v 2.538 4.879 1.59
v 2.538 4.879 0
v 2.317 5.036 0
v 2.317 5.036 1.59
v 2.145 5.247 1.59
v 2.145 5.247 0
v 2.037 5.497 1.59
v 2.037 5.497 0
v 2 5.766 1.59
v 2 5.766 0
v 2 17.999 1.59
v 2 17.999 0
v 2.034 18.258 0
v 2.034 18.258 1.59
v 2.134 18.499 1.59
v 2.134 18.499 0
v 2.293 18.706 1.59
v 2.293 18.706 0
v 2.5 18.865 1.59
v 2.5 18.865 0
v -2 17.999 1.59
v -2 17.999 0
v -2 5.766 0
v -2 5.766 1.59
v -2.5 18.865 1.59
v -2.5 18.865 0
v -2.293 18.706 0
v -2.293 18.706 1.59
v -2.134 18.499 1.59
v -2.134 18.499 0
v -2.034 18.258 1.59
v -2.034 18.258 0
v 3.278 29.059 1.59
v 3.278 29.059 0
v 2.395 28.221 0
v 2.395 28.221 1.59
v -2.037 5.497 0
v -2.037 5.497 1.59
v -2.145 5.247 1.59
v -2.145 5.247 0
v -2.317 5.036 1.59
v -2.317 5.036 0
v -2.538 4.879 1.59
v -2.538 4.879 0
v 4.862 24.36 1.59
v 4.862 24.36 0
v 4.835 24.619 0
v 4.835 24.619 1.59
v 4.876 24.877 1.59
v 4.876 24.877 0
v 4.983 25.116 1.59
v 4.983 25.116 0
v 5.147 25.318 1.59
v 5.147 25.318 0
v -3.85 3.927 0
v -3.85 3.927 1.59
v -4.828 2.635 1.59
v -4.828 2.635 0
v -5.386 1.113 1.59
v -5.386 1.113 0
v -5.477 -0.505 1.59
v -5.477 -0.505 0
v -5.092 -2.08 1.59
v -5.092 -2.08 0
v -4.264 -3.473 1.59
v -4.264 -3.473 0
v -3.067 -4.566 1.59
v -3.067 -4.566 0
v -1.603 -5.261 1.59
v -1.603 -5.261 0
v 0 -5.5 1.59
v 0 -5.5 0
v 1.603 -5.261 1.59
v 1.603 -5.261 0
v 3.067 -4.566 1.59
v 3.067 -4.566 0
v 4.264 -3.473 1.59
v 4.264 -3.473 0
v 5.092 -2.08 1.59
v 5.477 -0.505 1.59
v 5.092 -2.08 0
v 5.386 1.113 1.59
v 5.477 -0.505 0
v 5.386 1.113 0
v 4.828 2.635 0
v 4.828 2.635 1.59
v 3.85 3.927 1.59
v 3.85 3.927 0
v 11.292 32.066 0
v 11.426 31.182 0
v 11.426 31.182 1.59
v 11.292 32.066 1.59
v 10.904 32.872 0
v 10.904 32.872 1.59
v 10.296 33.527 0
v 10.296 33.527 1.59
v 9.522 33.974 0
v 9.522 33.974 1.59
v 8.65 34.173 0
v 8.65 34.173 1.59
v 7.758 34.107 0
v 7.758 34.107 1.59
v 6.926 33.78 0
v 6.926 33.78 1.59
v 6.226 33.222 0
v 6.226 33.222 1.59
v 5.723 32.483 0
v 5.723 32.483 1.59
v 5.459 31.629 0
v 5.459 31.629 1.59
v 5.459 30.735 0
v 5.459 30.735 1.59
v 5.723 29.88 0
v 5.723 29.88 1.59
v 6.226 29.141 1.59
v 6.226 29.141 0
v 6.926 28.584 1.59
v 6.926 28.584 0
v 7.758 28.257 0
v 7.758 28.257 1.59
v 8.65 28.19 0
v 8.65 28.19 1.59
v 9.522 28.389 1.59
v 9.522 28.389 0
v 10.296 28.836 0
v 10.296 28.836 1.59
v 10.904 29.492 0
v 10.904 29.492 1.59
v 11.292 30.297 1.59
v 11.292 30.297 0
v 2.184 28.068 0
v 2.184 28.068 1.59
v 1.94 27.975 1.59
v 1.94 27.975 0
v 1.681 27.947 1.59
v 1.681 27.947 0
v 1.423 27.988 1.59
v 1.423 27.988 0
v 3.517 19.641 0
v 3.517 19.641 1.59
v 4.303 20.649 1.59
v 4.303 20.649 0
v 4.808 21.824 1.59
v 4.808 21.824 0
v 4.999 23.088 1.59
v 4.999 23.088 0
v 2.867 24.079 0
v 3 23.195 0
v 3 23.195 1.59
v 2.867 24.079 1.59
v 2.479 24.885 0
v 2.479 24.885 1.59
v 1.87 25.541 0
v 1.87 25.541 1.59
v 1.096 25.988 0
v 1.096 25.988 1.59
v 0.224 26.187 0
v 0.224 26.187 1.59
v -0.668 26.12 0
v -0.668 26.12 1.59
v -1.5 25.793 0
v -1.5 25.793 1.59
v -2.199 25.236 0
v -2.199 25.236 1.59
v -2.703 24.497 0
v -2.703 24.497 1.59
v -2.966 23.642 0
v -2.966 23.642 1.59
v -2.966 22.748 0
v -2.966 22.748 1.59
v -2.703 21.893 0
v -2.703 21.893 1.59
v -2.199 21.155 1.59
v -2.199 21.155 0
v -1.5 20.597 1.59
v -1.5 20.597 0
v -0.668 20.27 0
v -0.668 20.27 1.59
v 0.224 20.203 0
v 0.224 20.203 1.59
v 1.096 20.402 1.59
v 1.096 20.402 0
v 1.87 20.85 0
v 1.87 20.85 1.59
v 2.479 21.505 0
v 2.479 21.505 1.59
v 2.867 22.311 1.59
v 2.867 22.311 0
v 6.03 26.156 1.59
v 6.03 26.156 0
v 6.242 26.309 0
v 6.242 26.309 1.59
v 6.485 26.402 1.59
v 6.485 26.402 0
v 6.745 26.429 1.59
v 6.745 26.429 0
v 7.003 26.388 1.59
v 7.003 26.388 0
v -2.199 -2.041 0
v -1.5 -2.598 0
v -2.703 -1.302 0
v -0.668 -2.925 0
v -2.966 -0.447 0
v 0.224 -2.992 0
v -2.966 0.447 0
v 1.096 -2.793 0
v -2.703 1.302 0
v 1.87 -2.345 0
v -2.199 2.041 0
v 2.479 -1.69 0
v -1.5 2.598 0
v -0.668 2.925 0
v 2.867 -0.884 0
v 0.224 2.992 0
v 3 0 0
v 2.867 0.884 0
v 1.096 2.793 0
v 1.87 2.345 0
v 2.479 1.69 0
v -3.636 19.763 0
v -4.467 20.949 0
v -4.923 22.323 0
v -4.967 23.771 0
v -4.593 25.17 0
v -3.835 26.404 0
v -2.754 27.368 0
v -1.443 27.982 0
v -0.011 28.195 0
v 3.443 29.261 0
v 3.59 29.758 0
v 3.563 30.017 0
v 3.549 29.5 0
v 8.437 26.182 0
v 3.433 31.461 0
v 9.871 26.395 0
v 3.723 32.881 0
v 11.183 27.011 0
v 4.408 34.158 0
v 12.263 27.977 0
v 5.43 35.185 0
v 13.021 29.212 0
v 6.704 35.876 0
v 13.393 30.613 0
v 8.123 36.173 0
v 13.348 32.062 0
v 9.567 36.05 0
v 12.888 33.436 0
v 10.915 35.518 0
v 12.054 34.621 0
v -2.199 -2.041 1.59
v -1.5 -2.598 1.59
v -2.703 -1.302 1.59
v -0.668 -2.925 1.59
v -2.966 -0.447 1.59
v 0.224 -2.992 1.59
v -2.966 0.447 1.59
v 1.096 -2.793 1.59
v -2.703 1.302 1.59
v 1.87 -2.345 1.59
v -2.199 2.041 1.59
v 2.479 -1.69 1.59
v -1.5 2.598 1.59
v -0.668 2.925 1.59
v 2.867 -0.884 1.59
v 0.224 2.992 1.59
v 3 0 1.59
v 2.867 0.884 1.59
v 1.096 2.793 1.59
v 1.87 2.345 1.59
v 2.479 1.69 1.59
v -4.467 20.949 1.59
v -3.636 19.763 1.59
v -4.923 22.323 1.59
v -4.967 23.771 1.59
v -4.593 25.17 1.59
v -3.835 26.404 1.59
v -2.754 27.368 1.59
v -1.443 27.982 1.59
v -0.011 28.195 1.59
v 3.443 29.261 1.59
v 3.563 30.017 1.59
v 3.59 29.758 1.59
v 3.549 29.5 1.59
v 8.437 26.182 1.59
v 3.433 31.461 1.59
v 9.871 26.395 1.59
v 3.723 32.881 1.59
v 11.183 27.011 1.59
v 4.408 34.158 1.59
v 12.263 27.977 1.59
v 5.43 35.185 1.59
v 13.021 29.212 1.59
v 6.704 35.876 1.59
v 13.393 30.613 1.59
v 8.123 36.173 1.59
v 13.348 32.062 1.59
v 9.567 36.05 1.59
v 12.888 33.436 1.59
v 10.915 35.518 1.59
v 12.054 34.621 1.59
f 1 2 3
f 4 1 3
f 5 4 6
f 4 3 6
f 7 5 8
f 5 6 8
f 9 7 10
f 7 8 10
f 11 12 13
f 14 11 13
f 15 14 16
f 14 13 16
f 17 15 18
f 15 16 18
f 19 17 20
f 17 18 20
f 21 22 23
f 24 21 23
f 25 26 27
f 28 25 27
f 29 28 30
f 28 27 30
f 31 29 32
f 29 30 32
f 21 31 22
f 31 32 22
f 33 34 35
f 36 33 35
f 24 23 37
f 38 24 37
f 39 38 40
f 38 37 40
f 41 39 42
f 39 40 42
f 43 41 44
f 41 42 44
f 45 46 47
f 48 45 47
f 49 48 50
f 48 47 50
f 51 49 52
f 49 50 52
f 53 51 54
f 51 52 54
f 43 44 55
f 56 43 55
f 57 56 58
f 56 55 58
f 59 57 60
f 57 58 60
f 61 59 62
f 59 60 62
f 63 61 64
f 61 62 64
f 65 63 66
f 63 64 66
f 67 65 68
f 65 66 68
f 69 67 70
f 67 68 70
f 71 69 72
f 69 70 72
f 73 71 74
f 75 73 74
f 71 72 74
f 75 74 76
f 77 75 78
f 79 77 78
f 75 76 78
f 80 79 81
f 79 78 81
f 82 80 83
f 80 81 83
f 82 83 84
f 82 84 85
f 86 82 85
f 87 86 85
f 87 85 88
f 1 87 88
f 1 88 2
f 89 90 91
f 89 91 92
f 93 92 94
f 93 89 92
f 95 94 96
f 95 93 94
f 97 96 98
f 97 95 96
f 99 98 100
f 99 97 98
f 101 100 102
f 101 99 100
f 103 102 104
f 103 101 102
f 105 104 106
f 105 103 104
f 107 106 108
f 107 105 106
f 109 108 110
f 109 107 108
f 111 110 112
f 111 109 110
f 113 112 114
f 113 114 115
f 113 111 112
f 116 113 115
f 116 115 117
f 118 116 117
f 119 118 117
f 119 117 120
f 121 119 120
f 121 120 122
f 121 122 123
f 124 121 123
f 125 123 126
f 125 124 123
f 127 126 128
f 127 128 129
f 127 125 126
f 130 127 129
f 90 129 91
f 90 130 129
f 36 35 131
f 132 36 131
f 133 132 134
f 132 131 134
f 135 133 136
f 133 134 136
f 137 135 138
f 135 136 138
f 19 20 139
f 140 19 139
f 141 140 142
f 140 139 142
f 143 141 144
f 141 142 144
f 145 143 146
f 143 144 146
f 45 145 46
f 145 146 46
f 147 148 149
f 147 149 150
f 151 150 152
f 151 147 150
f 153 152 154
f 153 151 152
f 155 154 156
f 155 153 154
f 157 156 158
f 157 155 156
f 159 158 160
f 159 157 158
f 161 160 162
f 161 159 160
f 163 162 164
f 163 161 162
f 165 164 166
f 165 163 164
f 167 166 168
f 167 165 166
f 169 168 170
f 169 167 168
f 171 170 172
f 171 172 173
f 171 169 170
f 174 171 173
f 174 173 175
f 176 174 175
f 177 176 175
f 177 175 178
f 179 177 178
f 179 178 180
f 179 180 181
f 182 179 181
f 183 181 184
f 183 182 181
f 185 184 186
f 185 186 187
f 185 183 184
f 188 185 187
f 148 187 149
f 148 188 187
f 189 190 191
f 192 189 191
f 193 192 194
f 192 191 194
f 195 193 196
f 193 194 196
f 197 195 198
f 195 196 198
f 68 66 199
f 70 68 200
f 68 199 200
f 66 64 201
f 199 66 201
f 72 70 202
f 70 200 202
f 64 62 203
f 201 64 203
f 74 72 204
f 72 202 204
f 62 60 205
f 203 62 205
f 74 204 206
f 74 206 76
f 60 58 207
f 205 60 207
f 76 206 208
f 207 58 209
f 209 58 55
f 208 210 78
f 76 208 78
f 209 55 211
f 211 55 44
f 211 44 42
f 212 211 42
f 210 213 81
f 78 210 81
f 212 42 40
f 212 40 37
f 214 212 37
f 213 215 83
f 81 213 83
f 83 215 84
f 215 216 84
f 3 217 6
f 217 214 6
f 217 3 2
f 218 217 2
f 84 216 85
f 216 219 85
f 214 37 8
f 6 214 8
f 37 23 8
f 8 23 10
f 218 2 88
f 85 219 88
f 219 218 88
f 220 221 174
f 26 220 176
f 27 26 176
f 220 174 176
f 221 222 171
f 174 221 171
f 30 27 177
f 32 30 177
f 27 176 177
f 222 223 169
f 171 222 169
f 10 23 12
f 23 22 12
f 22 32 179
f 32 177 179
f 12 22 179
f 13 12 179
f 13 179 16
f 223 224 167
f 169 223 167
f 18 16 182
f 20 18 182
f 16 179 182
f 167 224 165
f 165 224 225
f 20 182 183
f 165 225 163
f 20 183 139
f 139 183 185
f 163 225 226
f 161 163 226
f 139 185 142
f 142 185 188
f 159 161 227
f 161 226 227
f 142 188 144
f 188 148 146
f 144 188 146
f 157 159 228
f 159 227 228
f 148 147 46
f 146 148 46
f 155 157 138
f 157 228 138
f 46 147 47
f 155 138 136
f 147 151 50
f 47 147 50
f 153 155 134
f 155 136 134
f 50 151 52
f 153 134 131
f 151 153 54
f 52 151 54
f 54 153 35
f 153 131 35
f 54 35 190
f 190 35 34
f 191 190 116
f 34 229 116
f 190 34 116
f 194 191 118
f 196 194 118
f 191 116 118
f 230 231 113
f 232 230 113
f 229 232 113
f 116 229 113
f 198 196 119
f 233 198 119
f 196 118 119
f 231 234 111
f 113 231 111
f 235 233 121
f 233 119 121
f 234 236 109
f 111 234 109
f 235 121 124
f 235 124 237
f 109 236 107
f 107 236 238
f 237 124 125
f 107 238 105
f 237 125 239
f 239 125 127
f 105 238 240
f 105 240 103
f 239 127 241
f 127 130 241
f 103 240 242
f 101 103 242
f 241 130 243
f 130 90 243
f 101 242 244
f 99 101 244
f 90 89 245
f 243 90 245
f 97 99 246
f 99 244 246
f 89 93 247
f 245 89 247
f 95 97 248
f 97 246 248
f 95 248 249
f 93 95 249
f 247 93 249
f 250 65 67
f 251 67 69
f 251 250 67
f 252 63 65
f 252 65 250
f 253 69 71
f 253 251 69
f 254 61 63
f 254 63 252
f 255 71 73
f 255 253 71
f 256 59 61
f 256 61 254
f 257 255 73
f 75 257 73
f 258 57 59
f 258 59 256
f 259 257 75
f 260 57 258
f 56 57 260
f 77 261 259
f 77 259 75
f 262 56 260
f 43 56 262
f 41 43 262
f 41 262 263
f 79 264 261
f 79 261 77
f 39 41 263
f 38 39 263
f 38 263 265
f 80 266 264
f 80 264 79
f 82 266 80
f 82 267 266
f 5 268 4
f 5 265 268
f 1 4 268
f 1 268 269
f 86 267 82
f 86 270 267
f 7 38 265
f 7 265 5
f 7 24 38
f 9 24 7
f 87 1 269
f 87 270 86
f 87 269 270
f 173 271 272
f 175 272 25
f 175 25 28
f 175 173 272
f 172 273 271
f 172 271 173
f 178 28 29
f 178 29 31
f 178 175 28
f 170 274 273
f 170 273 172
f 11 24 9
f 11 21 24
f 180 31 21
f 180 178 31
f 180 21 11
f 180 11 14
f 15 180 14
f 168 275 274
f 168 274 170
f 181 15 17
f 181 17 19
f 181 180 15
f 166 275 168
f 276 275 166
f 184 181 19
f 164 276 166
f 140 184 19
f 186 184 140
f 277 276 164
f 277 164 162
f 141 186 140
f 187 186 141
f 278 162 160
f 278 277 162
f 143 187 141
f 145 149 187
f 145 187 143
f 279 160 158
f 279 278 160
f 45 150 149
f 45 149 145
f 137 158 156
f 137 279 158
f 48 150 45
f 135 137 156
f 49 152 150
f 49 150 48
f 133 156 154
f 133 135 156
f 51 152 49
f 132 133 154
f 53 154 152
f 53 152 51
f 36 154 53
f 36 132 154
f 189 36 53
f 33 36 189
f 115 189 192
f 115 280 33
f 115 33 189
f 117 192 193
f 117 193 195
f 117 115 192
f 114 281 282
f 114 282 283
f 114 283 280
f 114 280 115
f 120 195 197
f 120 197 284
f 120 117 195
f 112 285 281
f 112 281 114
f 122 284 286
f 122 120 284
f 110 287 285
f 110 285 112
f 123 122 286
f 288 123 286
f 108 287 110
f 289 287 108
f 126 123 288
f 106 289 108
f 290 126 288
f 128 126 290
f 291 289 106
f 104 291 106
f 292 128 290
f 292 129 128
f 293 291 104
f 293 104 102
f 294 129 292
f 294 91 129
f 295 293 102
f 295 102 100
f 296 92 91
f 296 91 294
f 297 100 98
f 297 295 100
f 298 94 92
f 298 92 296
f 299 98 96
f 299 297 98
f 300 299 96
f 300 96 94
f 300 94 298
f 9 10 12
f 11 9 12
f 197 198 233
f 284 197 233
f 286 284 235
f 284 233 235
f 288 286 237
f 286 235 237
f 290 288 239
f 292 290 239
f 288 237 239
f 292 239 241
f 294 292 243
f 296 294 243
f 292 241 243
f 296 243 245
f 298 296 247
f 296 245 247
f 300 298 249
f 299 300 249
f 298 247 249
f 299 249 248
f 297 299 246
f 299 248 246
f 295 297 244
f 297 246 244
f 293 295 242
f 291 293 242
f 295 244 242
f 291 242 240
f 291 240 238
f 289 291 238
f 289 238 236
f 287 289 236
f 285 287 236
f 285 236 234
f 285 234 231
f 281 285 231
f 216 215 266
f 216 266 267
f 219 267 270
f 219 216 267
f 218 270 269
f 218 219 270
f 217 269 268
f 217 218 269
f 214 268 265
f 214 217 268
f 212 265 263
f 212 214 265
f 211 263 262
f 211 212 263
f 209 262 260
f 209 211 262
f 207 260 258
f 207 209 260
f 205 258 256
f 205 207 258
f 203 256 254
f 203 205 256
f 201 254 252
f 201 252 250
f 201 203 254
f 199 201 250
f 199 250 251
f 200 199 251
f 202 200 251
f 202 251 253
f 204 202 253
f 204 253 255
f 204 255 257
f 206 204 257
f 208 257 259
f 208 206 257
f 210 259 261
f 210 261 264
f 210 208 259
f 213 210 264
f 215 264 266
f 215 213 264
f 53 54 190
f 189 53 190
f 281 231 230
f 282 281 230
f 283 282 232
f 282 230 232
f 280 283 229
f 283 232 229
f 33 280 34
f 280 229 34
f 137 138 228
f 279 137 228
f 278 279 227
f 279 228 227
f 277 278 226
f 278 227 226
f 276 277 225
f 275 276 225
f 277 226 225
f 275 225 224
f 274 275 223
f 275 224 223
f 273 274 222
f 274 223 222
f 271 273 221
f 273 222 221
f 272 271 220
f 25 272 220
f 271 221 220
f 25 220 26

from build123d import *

# Parameters (mm, degrees)
SKETCH1_R           = 3
BOSS_EXTRUDE1_DEPTH = 1.59


with BuildPart() as part:
    # Sketch1 → Boss-Extrude1 (new body)
    with BuildSketch(Plane.XY):
        with BuildLine():
            Line((5.147045903, 25.318285926), (6.030288505, 26.155519293))
            ThreePointArc((6.030288505, 26.155519293), (6.485334938, 26.402261945), (7.002788035, 26.388424134))
            ThreePointArc((7.002788035, 26.388424134), (12.054313697, 34.621489097), (3.563031664, 30.017208519))
            ThreePointArc((3.563031664, 30.017208519), (3.549193853, 29.499755422), (3.278483409, 29.058546801))
            Line((3.278483409, 29.058546801), (2.395240806, 28.221313434))
            ThreePointArc((2.395240806, 28.221313434), (1.940194374, 27.974570781), (1.422741277, 27.988408592))
            ThreePointArc((1.422741277, 27.988408592), (-4.593407333, 25.170095968), (-2.5, 18.864972981))
            ThreePointArc((-2.5, 18.864972981), (-2.133974596, 18.498947577), (-2, 17.998947577))
            Line((-2, 17.998947577), (-2, 5.766281297))
            ThreePointArc((-2, 5.766281297), (-2.145149586, 5.247406776), (-2.538461538, 4.879161098))
            ThreePointArc((-2.538461538, 4.879161098), (0, -5.5), (2.538461538, 4.879161098))
            ThreePointArc((2.538461538, 4.879161098), (2.145149586, 5.247406776), (2, 5.766281297))
            Line((2, 5.766281297), (2, 17.998947577))
            ThreePointArc((2, 17.998947577), (2.133974596, 18.498947577), (2.5, 18.864972981))
            ThreePointArc((2.5, 18.864972981), (4.593407333, 21.220104032), (4.862497647, 24.359624207))
            ThreePointArc((4.862497647, 24.359624207), (4.876335458, 24.877077304), (5.147045903, 25.318285926))
        make_face()
        Circle(SKETCH1_R, mode=Mode.SUBTRACT)
        with Locations((0, 23.1951)):
            Circle(SKETCH1_R, mode=Mode.SUBTRACT)
        with Locations((8.425529312, 31.181732726)):
            Circle(SKETCH1_R, mode=Mode.SUBTRACT)
    extrude(amount=BOSS_EXTRUDE1_DEPTH)


solid = part.part
